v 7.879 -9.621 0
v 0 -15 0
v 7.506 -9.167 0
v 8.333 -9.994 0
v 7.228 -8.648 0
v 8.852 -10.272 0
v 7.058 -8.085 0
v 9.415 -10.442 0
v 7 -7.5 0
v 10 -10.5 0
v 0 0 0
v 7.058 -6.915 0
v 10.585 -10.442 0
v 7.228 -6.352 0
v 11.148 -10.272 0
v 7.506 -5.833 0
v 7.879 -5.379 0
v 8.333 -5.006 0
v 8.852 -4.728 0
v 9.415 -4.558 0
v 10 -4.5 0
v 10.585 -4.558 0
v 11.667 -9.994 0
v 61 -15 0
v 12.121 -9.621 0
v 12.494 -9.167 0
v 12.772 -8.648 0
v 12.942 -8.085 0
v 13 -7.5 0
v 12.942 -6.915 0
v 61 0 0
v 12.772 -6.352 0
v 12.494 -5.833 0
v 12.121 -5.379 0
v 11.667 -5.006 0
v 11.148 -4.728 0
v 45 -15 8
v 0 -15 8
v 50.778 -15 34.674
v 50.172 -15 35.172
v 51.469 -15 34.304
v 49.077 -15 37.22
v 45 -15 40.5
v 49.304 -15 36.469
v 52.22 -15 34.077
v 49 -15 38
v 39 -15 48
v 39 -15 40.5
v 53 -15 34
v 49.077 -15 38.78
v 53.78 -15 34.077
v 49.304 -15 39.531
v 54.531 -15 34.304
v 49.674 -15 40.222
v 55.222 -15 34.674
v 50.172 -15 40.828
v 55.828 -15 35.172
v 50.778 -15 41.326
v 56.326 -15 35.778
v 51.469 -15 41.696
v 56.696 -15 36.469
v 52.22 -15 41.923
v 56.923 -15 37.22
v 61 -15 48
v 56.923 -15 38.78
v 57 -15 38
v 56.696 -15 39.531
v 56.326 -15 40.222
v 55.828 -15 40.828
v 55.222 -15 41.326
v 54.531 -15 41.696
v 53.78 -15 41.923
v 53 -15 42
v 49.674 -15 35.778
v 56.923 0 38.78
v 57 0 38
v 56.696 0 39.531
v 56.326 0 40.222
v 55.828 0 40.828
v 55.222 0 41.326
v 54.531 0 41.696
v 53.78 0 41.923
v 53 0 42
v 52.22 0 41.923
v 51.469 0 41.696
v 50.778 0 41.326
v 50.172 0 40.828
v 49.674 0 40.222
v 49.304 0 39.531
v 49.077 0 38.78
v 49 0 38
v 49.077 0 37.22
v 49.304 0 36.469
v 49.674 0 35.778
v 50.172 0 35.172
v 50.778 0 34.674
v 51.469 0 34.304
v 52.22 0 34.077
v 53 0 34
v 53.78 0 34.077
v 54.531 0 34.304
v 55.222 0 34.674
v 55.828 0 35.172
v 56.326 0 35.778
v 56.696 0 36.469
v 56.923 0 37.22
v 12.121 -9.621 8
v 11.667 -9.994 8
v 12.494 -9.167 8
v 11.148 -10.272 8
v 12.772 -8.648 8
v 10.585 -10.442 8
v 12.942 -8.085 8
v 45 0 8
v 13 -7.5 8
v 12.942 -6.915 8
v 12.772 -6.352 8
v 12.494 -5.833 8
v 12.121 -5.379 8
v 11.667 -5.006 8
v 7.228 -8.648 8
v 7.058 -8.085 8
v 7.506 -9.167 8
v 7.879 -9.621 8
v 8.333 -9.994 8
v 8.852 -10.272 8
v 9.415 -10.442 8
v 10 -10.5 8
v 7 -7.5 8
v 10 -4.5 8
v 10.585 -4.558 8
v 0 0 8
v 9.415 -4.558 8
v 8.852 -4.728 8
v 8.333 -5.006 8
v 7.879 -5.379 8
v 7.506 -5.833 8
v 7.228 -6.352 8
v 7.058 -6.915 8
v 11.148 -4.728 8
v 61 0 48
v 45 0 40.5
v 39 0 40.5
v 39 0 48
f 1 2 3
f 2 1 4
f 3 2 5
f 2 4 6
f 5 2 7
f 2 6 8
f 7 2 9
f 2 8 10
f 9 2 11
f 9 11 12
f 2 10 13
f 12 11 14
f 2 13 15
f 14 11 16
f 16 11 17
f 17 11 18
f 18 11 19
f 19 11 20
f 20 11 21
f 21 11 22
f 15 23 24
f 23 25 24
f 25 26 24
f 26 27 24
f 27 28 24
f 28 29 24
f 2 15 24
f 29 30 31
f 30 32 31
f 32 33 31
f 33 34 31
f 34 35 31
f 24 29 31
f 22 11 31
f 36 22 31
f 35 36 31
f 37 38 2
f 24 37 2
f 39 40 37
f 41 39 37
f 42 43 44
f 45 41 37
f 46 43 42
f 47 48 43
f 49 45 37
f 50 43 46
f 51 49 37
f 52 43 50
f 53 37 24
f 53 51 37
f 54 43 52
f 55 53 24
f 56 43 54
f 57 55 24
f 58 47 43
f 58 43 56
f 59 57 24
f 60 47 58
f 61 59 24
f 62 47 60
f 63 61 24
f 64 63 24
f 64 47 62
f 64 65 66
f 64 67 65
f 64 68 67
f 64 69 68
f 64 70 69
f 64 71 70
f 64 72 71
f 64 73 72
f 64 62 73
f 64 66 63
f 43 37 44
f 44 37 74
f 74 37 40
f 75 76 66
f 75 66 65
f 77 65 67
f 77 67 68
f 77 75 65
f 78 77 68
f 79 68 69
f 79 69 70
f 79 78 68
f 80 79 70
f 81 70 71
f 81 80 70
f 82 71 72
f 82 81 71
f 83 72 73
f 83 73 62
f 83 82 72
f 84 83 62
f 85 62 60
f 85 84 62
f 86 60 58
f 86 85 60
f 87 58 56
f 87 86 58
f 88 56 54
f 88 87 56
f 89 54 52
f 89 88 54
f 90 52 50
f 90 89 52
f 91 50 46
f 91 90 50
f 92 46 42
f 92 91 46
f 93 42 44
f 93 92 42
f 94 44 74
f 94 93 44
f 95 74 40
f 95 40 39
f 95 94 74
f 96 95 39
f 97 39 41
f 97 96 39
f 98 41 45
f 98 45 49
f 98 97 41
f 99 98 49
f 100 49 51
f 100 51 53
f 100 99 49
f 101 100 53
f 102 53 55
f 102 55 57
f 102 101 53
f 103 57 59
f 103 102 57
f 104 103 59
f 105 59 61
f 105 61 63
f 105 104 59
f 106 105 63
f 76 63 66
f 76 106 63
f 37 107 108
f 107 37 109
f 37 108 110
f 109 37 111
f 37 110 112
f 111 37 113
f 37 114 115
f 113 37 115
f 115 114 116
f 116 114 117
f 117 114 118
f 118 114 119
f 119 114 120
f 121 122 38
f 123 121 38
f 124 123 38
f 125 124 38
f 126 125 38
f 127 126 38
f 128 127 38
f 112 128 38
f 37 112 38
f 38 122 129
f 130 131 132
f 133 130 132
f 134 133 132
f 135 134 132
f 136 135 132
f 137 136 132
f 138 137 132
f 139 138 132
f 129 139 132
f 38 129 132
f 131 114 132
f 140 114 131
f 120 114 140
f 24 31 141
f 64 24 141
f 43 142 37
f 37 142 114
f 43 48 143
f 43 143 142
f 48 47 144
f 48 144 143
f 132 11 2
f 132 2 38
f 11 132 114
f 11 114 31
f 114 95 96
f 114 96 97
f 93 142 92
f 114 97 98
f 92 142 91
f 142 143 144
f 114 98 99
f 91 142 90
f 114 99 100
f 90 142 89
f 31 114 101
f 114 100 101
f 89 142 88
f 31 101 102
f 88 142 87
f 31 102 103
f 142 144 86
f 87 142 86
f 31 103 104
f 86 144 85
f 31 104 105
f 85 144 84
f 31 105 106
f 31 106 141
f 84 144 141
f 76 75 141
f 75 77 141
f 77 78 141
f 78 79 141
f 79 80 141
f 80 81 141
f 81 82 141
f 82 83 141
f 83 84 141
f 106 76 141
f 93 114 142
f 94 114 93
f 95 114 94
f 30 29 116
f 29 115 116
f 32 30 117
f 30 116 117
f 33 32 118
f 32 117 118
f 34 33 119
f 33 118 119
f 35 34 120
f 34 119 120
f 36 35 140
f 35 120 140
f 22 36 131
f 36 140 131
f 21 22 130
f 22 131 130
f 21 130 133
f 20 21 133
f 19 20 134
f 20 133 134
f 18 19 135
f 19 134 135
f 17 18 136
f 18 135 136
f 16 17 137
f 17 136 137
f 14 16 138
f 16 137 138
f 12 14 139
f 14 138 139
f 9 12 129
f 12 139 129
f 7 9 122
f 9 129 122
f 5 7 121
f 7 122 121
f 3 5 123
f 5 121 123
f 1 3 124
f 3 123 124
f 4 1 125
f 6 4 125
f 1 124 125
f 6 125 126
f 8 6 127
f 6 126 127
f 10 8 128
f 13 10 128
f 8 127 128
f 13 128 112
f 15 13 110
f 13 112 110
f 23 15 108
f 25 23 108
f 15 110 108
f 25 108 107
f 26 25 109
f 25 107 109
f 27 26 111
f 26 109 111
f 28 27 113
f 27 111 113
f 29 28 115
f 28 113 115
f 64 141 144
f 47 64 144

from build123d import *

# Parameters (mm, degrees)
F0_W     = 45
F0_H     = 8
F0_W_2   = 16
F0_R     = 4
F0_H_2   = 2
F1_DEPTH = 15
F2_R     = 3
F3_DEPTH = 55.5


# Not quite as in the source:
# - a feature names something its author has since deleted; it is built from what else it names


with BuildPart() as f1:
    # F0 (on Front) → F1 (new body)
    with BuildSketch(Plane.XZ):
        with Locations((22.5, 4)):
            Rectangle(F0_W, F0_H)
        with Locations((53, 4)):
            Rectangle(F0_W_2, F0_H)
        Polygon((45, 40.5), (45, 8), (61, 8), (61, 46), (45, 46), align=None)
        with Locations((53, 38)):
            Circle(F0_R, mode=Mode.SUBTRACT)
        Polygon((39, 40.5), (45, 40.5), (45, 46), (45, 48), (39, 48), align=None)
        with Locations((53, 47)):
            Rectangle(F0_W_2, F0_H_2)
    extrude(amount=F1_DEPTH)

    # F2 (on face) → F3 (cut, symmetric)
    with BuildSketch(Plane.XY.offset(8)):
        with Locations((10, -7.5)):
            Circle(F2_R)
    extrude(amount=F3_DEPTH, both=True, mode=Mode.SUBTRACT)


solid = f1.part
